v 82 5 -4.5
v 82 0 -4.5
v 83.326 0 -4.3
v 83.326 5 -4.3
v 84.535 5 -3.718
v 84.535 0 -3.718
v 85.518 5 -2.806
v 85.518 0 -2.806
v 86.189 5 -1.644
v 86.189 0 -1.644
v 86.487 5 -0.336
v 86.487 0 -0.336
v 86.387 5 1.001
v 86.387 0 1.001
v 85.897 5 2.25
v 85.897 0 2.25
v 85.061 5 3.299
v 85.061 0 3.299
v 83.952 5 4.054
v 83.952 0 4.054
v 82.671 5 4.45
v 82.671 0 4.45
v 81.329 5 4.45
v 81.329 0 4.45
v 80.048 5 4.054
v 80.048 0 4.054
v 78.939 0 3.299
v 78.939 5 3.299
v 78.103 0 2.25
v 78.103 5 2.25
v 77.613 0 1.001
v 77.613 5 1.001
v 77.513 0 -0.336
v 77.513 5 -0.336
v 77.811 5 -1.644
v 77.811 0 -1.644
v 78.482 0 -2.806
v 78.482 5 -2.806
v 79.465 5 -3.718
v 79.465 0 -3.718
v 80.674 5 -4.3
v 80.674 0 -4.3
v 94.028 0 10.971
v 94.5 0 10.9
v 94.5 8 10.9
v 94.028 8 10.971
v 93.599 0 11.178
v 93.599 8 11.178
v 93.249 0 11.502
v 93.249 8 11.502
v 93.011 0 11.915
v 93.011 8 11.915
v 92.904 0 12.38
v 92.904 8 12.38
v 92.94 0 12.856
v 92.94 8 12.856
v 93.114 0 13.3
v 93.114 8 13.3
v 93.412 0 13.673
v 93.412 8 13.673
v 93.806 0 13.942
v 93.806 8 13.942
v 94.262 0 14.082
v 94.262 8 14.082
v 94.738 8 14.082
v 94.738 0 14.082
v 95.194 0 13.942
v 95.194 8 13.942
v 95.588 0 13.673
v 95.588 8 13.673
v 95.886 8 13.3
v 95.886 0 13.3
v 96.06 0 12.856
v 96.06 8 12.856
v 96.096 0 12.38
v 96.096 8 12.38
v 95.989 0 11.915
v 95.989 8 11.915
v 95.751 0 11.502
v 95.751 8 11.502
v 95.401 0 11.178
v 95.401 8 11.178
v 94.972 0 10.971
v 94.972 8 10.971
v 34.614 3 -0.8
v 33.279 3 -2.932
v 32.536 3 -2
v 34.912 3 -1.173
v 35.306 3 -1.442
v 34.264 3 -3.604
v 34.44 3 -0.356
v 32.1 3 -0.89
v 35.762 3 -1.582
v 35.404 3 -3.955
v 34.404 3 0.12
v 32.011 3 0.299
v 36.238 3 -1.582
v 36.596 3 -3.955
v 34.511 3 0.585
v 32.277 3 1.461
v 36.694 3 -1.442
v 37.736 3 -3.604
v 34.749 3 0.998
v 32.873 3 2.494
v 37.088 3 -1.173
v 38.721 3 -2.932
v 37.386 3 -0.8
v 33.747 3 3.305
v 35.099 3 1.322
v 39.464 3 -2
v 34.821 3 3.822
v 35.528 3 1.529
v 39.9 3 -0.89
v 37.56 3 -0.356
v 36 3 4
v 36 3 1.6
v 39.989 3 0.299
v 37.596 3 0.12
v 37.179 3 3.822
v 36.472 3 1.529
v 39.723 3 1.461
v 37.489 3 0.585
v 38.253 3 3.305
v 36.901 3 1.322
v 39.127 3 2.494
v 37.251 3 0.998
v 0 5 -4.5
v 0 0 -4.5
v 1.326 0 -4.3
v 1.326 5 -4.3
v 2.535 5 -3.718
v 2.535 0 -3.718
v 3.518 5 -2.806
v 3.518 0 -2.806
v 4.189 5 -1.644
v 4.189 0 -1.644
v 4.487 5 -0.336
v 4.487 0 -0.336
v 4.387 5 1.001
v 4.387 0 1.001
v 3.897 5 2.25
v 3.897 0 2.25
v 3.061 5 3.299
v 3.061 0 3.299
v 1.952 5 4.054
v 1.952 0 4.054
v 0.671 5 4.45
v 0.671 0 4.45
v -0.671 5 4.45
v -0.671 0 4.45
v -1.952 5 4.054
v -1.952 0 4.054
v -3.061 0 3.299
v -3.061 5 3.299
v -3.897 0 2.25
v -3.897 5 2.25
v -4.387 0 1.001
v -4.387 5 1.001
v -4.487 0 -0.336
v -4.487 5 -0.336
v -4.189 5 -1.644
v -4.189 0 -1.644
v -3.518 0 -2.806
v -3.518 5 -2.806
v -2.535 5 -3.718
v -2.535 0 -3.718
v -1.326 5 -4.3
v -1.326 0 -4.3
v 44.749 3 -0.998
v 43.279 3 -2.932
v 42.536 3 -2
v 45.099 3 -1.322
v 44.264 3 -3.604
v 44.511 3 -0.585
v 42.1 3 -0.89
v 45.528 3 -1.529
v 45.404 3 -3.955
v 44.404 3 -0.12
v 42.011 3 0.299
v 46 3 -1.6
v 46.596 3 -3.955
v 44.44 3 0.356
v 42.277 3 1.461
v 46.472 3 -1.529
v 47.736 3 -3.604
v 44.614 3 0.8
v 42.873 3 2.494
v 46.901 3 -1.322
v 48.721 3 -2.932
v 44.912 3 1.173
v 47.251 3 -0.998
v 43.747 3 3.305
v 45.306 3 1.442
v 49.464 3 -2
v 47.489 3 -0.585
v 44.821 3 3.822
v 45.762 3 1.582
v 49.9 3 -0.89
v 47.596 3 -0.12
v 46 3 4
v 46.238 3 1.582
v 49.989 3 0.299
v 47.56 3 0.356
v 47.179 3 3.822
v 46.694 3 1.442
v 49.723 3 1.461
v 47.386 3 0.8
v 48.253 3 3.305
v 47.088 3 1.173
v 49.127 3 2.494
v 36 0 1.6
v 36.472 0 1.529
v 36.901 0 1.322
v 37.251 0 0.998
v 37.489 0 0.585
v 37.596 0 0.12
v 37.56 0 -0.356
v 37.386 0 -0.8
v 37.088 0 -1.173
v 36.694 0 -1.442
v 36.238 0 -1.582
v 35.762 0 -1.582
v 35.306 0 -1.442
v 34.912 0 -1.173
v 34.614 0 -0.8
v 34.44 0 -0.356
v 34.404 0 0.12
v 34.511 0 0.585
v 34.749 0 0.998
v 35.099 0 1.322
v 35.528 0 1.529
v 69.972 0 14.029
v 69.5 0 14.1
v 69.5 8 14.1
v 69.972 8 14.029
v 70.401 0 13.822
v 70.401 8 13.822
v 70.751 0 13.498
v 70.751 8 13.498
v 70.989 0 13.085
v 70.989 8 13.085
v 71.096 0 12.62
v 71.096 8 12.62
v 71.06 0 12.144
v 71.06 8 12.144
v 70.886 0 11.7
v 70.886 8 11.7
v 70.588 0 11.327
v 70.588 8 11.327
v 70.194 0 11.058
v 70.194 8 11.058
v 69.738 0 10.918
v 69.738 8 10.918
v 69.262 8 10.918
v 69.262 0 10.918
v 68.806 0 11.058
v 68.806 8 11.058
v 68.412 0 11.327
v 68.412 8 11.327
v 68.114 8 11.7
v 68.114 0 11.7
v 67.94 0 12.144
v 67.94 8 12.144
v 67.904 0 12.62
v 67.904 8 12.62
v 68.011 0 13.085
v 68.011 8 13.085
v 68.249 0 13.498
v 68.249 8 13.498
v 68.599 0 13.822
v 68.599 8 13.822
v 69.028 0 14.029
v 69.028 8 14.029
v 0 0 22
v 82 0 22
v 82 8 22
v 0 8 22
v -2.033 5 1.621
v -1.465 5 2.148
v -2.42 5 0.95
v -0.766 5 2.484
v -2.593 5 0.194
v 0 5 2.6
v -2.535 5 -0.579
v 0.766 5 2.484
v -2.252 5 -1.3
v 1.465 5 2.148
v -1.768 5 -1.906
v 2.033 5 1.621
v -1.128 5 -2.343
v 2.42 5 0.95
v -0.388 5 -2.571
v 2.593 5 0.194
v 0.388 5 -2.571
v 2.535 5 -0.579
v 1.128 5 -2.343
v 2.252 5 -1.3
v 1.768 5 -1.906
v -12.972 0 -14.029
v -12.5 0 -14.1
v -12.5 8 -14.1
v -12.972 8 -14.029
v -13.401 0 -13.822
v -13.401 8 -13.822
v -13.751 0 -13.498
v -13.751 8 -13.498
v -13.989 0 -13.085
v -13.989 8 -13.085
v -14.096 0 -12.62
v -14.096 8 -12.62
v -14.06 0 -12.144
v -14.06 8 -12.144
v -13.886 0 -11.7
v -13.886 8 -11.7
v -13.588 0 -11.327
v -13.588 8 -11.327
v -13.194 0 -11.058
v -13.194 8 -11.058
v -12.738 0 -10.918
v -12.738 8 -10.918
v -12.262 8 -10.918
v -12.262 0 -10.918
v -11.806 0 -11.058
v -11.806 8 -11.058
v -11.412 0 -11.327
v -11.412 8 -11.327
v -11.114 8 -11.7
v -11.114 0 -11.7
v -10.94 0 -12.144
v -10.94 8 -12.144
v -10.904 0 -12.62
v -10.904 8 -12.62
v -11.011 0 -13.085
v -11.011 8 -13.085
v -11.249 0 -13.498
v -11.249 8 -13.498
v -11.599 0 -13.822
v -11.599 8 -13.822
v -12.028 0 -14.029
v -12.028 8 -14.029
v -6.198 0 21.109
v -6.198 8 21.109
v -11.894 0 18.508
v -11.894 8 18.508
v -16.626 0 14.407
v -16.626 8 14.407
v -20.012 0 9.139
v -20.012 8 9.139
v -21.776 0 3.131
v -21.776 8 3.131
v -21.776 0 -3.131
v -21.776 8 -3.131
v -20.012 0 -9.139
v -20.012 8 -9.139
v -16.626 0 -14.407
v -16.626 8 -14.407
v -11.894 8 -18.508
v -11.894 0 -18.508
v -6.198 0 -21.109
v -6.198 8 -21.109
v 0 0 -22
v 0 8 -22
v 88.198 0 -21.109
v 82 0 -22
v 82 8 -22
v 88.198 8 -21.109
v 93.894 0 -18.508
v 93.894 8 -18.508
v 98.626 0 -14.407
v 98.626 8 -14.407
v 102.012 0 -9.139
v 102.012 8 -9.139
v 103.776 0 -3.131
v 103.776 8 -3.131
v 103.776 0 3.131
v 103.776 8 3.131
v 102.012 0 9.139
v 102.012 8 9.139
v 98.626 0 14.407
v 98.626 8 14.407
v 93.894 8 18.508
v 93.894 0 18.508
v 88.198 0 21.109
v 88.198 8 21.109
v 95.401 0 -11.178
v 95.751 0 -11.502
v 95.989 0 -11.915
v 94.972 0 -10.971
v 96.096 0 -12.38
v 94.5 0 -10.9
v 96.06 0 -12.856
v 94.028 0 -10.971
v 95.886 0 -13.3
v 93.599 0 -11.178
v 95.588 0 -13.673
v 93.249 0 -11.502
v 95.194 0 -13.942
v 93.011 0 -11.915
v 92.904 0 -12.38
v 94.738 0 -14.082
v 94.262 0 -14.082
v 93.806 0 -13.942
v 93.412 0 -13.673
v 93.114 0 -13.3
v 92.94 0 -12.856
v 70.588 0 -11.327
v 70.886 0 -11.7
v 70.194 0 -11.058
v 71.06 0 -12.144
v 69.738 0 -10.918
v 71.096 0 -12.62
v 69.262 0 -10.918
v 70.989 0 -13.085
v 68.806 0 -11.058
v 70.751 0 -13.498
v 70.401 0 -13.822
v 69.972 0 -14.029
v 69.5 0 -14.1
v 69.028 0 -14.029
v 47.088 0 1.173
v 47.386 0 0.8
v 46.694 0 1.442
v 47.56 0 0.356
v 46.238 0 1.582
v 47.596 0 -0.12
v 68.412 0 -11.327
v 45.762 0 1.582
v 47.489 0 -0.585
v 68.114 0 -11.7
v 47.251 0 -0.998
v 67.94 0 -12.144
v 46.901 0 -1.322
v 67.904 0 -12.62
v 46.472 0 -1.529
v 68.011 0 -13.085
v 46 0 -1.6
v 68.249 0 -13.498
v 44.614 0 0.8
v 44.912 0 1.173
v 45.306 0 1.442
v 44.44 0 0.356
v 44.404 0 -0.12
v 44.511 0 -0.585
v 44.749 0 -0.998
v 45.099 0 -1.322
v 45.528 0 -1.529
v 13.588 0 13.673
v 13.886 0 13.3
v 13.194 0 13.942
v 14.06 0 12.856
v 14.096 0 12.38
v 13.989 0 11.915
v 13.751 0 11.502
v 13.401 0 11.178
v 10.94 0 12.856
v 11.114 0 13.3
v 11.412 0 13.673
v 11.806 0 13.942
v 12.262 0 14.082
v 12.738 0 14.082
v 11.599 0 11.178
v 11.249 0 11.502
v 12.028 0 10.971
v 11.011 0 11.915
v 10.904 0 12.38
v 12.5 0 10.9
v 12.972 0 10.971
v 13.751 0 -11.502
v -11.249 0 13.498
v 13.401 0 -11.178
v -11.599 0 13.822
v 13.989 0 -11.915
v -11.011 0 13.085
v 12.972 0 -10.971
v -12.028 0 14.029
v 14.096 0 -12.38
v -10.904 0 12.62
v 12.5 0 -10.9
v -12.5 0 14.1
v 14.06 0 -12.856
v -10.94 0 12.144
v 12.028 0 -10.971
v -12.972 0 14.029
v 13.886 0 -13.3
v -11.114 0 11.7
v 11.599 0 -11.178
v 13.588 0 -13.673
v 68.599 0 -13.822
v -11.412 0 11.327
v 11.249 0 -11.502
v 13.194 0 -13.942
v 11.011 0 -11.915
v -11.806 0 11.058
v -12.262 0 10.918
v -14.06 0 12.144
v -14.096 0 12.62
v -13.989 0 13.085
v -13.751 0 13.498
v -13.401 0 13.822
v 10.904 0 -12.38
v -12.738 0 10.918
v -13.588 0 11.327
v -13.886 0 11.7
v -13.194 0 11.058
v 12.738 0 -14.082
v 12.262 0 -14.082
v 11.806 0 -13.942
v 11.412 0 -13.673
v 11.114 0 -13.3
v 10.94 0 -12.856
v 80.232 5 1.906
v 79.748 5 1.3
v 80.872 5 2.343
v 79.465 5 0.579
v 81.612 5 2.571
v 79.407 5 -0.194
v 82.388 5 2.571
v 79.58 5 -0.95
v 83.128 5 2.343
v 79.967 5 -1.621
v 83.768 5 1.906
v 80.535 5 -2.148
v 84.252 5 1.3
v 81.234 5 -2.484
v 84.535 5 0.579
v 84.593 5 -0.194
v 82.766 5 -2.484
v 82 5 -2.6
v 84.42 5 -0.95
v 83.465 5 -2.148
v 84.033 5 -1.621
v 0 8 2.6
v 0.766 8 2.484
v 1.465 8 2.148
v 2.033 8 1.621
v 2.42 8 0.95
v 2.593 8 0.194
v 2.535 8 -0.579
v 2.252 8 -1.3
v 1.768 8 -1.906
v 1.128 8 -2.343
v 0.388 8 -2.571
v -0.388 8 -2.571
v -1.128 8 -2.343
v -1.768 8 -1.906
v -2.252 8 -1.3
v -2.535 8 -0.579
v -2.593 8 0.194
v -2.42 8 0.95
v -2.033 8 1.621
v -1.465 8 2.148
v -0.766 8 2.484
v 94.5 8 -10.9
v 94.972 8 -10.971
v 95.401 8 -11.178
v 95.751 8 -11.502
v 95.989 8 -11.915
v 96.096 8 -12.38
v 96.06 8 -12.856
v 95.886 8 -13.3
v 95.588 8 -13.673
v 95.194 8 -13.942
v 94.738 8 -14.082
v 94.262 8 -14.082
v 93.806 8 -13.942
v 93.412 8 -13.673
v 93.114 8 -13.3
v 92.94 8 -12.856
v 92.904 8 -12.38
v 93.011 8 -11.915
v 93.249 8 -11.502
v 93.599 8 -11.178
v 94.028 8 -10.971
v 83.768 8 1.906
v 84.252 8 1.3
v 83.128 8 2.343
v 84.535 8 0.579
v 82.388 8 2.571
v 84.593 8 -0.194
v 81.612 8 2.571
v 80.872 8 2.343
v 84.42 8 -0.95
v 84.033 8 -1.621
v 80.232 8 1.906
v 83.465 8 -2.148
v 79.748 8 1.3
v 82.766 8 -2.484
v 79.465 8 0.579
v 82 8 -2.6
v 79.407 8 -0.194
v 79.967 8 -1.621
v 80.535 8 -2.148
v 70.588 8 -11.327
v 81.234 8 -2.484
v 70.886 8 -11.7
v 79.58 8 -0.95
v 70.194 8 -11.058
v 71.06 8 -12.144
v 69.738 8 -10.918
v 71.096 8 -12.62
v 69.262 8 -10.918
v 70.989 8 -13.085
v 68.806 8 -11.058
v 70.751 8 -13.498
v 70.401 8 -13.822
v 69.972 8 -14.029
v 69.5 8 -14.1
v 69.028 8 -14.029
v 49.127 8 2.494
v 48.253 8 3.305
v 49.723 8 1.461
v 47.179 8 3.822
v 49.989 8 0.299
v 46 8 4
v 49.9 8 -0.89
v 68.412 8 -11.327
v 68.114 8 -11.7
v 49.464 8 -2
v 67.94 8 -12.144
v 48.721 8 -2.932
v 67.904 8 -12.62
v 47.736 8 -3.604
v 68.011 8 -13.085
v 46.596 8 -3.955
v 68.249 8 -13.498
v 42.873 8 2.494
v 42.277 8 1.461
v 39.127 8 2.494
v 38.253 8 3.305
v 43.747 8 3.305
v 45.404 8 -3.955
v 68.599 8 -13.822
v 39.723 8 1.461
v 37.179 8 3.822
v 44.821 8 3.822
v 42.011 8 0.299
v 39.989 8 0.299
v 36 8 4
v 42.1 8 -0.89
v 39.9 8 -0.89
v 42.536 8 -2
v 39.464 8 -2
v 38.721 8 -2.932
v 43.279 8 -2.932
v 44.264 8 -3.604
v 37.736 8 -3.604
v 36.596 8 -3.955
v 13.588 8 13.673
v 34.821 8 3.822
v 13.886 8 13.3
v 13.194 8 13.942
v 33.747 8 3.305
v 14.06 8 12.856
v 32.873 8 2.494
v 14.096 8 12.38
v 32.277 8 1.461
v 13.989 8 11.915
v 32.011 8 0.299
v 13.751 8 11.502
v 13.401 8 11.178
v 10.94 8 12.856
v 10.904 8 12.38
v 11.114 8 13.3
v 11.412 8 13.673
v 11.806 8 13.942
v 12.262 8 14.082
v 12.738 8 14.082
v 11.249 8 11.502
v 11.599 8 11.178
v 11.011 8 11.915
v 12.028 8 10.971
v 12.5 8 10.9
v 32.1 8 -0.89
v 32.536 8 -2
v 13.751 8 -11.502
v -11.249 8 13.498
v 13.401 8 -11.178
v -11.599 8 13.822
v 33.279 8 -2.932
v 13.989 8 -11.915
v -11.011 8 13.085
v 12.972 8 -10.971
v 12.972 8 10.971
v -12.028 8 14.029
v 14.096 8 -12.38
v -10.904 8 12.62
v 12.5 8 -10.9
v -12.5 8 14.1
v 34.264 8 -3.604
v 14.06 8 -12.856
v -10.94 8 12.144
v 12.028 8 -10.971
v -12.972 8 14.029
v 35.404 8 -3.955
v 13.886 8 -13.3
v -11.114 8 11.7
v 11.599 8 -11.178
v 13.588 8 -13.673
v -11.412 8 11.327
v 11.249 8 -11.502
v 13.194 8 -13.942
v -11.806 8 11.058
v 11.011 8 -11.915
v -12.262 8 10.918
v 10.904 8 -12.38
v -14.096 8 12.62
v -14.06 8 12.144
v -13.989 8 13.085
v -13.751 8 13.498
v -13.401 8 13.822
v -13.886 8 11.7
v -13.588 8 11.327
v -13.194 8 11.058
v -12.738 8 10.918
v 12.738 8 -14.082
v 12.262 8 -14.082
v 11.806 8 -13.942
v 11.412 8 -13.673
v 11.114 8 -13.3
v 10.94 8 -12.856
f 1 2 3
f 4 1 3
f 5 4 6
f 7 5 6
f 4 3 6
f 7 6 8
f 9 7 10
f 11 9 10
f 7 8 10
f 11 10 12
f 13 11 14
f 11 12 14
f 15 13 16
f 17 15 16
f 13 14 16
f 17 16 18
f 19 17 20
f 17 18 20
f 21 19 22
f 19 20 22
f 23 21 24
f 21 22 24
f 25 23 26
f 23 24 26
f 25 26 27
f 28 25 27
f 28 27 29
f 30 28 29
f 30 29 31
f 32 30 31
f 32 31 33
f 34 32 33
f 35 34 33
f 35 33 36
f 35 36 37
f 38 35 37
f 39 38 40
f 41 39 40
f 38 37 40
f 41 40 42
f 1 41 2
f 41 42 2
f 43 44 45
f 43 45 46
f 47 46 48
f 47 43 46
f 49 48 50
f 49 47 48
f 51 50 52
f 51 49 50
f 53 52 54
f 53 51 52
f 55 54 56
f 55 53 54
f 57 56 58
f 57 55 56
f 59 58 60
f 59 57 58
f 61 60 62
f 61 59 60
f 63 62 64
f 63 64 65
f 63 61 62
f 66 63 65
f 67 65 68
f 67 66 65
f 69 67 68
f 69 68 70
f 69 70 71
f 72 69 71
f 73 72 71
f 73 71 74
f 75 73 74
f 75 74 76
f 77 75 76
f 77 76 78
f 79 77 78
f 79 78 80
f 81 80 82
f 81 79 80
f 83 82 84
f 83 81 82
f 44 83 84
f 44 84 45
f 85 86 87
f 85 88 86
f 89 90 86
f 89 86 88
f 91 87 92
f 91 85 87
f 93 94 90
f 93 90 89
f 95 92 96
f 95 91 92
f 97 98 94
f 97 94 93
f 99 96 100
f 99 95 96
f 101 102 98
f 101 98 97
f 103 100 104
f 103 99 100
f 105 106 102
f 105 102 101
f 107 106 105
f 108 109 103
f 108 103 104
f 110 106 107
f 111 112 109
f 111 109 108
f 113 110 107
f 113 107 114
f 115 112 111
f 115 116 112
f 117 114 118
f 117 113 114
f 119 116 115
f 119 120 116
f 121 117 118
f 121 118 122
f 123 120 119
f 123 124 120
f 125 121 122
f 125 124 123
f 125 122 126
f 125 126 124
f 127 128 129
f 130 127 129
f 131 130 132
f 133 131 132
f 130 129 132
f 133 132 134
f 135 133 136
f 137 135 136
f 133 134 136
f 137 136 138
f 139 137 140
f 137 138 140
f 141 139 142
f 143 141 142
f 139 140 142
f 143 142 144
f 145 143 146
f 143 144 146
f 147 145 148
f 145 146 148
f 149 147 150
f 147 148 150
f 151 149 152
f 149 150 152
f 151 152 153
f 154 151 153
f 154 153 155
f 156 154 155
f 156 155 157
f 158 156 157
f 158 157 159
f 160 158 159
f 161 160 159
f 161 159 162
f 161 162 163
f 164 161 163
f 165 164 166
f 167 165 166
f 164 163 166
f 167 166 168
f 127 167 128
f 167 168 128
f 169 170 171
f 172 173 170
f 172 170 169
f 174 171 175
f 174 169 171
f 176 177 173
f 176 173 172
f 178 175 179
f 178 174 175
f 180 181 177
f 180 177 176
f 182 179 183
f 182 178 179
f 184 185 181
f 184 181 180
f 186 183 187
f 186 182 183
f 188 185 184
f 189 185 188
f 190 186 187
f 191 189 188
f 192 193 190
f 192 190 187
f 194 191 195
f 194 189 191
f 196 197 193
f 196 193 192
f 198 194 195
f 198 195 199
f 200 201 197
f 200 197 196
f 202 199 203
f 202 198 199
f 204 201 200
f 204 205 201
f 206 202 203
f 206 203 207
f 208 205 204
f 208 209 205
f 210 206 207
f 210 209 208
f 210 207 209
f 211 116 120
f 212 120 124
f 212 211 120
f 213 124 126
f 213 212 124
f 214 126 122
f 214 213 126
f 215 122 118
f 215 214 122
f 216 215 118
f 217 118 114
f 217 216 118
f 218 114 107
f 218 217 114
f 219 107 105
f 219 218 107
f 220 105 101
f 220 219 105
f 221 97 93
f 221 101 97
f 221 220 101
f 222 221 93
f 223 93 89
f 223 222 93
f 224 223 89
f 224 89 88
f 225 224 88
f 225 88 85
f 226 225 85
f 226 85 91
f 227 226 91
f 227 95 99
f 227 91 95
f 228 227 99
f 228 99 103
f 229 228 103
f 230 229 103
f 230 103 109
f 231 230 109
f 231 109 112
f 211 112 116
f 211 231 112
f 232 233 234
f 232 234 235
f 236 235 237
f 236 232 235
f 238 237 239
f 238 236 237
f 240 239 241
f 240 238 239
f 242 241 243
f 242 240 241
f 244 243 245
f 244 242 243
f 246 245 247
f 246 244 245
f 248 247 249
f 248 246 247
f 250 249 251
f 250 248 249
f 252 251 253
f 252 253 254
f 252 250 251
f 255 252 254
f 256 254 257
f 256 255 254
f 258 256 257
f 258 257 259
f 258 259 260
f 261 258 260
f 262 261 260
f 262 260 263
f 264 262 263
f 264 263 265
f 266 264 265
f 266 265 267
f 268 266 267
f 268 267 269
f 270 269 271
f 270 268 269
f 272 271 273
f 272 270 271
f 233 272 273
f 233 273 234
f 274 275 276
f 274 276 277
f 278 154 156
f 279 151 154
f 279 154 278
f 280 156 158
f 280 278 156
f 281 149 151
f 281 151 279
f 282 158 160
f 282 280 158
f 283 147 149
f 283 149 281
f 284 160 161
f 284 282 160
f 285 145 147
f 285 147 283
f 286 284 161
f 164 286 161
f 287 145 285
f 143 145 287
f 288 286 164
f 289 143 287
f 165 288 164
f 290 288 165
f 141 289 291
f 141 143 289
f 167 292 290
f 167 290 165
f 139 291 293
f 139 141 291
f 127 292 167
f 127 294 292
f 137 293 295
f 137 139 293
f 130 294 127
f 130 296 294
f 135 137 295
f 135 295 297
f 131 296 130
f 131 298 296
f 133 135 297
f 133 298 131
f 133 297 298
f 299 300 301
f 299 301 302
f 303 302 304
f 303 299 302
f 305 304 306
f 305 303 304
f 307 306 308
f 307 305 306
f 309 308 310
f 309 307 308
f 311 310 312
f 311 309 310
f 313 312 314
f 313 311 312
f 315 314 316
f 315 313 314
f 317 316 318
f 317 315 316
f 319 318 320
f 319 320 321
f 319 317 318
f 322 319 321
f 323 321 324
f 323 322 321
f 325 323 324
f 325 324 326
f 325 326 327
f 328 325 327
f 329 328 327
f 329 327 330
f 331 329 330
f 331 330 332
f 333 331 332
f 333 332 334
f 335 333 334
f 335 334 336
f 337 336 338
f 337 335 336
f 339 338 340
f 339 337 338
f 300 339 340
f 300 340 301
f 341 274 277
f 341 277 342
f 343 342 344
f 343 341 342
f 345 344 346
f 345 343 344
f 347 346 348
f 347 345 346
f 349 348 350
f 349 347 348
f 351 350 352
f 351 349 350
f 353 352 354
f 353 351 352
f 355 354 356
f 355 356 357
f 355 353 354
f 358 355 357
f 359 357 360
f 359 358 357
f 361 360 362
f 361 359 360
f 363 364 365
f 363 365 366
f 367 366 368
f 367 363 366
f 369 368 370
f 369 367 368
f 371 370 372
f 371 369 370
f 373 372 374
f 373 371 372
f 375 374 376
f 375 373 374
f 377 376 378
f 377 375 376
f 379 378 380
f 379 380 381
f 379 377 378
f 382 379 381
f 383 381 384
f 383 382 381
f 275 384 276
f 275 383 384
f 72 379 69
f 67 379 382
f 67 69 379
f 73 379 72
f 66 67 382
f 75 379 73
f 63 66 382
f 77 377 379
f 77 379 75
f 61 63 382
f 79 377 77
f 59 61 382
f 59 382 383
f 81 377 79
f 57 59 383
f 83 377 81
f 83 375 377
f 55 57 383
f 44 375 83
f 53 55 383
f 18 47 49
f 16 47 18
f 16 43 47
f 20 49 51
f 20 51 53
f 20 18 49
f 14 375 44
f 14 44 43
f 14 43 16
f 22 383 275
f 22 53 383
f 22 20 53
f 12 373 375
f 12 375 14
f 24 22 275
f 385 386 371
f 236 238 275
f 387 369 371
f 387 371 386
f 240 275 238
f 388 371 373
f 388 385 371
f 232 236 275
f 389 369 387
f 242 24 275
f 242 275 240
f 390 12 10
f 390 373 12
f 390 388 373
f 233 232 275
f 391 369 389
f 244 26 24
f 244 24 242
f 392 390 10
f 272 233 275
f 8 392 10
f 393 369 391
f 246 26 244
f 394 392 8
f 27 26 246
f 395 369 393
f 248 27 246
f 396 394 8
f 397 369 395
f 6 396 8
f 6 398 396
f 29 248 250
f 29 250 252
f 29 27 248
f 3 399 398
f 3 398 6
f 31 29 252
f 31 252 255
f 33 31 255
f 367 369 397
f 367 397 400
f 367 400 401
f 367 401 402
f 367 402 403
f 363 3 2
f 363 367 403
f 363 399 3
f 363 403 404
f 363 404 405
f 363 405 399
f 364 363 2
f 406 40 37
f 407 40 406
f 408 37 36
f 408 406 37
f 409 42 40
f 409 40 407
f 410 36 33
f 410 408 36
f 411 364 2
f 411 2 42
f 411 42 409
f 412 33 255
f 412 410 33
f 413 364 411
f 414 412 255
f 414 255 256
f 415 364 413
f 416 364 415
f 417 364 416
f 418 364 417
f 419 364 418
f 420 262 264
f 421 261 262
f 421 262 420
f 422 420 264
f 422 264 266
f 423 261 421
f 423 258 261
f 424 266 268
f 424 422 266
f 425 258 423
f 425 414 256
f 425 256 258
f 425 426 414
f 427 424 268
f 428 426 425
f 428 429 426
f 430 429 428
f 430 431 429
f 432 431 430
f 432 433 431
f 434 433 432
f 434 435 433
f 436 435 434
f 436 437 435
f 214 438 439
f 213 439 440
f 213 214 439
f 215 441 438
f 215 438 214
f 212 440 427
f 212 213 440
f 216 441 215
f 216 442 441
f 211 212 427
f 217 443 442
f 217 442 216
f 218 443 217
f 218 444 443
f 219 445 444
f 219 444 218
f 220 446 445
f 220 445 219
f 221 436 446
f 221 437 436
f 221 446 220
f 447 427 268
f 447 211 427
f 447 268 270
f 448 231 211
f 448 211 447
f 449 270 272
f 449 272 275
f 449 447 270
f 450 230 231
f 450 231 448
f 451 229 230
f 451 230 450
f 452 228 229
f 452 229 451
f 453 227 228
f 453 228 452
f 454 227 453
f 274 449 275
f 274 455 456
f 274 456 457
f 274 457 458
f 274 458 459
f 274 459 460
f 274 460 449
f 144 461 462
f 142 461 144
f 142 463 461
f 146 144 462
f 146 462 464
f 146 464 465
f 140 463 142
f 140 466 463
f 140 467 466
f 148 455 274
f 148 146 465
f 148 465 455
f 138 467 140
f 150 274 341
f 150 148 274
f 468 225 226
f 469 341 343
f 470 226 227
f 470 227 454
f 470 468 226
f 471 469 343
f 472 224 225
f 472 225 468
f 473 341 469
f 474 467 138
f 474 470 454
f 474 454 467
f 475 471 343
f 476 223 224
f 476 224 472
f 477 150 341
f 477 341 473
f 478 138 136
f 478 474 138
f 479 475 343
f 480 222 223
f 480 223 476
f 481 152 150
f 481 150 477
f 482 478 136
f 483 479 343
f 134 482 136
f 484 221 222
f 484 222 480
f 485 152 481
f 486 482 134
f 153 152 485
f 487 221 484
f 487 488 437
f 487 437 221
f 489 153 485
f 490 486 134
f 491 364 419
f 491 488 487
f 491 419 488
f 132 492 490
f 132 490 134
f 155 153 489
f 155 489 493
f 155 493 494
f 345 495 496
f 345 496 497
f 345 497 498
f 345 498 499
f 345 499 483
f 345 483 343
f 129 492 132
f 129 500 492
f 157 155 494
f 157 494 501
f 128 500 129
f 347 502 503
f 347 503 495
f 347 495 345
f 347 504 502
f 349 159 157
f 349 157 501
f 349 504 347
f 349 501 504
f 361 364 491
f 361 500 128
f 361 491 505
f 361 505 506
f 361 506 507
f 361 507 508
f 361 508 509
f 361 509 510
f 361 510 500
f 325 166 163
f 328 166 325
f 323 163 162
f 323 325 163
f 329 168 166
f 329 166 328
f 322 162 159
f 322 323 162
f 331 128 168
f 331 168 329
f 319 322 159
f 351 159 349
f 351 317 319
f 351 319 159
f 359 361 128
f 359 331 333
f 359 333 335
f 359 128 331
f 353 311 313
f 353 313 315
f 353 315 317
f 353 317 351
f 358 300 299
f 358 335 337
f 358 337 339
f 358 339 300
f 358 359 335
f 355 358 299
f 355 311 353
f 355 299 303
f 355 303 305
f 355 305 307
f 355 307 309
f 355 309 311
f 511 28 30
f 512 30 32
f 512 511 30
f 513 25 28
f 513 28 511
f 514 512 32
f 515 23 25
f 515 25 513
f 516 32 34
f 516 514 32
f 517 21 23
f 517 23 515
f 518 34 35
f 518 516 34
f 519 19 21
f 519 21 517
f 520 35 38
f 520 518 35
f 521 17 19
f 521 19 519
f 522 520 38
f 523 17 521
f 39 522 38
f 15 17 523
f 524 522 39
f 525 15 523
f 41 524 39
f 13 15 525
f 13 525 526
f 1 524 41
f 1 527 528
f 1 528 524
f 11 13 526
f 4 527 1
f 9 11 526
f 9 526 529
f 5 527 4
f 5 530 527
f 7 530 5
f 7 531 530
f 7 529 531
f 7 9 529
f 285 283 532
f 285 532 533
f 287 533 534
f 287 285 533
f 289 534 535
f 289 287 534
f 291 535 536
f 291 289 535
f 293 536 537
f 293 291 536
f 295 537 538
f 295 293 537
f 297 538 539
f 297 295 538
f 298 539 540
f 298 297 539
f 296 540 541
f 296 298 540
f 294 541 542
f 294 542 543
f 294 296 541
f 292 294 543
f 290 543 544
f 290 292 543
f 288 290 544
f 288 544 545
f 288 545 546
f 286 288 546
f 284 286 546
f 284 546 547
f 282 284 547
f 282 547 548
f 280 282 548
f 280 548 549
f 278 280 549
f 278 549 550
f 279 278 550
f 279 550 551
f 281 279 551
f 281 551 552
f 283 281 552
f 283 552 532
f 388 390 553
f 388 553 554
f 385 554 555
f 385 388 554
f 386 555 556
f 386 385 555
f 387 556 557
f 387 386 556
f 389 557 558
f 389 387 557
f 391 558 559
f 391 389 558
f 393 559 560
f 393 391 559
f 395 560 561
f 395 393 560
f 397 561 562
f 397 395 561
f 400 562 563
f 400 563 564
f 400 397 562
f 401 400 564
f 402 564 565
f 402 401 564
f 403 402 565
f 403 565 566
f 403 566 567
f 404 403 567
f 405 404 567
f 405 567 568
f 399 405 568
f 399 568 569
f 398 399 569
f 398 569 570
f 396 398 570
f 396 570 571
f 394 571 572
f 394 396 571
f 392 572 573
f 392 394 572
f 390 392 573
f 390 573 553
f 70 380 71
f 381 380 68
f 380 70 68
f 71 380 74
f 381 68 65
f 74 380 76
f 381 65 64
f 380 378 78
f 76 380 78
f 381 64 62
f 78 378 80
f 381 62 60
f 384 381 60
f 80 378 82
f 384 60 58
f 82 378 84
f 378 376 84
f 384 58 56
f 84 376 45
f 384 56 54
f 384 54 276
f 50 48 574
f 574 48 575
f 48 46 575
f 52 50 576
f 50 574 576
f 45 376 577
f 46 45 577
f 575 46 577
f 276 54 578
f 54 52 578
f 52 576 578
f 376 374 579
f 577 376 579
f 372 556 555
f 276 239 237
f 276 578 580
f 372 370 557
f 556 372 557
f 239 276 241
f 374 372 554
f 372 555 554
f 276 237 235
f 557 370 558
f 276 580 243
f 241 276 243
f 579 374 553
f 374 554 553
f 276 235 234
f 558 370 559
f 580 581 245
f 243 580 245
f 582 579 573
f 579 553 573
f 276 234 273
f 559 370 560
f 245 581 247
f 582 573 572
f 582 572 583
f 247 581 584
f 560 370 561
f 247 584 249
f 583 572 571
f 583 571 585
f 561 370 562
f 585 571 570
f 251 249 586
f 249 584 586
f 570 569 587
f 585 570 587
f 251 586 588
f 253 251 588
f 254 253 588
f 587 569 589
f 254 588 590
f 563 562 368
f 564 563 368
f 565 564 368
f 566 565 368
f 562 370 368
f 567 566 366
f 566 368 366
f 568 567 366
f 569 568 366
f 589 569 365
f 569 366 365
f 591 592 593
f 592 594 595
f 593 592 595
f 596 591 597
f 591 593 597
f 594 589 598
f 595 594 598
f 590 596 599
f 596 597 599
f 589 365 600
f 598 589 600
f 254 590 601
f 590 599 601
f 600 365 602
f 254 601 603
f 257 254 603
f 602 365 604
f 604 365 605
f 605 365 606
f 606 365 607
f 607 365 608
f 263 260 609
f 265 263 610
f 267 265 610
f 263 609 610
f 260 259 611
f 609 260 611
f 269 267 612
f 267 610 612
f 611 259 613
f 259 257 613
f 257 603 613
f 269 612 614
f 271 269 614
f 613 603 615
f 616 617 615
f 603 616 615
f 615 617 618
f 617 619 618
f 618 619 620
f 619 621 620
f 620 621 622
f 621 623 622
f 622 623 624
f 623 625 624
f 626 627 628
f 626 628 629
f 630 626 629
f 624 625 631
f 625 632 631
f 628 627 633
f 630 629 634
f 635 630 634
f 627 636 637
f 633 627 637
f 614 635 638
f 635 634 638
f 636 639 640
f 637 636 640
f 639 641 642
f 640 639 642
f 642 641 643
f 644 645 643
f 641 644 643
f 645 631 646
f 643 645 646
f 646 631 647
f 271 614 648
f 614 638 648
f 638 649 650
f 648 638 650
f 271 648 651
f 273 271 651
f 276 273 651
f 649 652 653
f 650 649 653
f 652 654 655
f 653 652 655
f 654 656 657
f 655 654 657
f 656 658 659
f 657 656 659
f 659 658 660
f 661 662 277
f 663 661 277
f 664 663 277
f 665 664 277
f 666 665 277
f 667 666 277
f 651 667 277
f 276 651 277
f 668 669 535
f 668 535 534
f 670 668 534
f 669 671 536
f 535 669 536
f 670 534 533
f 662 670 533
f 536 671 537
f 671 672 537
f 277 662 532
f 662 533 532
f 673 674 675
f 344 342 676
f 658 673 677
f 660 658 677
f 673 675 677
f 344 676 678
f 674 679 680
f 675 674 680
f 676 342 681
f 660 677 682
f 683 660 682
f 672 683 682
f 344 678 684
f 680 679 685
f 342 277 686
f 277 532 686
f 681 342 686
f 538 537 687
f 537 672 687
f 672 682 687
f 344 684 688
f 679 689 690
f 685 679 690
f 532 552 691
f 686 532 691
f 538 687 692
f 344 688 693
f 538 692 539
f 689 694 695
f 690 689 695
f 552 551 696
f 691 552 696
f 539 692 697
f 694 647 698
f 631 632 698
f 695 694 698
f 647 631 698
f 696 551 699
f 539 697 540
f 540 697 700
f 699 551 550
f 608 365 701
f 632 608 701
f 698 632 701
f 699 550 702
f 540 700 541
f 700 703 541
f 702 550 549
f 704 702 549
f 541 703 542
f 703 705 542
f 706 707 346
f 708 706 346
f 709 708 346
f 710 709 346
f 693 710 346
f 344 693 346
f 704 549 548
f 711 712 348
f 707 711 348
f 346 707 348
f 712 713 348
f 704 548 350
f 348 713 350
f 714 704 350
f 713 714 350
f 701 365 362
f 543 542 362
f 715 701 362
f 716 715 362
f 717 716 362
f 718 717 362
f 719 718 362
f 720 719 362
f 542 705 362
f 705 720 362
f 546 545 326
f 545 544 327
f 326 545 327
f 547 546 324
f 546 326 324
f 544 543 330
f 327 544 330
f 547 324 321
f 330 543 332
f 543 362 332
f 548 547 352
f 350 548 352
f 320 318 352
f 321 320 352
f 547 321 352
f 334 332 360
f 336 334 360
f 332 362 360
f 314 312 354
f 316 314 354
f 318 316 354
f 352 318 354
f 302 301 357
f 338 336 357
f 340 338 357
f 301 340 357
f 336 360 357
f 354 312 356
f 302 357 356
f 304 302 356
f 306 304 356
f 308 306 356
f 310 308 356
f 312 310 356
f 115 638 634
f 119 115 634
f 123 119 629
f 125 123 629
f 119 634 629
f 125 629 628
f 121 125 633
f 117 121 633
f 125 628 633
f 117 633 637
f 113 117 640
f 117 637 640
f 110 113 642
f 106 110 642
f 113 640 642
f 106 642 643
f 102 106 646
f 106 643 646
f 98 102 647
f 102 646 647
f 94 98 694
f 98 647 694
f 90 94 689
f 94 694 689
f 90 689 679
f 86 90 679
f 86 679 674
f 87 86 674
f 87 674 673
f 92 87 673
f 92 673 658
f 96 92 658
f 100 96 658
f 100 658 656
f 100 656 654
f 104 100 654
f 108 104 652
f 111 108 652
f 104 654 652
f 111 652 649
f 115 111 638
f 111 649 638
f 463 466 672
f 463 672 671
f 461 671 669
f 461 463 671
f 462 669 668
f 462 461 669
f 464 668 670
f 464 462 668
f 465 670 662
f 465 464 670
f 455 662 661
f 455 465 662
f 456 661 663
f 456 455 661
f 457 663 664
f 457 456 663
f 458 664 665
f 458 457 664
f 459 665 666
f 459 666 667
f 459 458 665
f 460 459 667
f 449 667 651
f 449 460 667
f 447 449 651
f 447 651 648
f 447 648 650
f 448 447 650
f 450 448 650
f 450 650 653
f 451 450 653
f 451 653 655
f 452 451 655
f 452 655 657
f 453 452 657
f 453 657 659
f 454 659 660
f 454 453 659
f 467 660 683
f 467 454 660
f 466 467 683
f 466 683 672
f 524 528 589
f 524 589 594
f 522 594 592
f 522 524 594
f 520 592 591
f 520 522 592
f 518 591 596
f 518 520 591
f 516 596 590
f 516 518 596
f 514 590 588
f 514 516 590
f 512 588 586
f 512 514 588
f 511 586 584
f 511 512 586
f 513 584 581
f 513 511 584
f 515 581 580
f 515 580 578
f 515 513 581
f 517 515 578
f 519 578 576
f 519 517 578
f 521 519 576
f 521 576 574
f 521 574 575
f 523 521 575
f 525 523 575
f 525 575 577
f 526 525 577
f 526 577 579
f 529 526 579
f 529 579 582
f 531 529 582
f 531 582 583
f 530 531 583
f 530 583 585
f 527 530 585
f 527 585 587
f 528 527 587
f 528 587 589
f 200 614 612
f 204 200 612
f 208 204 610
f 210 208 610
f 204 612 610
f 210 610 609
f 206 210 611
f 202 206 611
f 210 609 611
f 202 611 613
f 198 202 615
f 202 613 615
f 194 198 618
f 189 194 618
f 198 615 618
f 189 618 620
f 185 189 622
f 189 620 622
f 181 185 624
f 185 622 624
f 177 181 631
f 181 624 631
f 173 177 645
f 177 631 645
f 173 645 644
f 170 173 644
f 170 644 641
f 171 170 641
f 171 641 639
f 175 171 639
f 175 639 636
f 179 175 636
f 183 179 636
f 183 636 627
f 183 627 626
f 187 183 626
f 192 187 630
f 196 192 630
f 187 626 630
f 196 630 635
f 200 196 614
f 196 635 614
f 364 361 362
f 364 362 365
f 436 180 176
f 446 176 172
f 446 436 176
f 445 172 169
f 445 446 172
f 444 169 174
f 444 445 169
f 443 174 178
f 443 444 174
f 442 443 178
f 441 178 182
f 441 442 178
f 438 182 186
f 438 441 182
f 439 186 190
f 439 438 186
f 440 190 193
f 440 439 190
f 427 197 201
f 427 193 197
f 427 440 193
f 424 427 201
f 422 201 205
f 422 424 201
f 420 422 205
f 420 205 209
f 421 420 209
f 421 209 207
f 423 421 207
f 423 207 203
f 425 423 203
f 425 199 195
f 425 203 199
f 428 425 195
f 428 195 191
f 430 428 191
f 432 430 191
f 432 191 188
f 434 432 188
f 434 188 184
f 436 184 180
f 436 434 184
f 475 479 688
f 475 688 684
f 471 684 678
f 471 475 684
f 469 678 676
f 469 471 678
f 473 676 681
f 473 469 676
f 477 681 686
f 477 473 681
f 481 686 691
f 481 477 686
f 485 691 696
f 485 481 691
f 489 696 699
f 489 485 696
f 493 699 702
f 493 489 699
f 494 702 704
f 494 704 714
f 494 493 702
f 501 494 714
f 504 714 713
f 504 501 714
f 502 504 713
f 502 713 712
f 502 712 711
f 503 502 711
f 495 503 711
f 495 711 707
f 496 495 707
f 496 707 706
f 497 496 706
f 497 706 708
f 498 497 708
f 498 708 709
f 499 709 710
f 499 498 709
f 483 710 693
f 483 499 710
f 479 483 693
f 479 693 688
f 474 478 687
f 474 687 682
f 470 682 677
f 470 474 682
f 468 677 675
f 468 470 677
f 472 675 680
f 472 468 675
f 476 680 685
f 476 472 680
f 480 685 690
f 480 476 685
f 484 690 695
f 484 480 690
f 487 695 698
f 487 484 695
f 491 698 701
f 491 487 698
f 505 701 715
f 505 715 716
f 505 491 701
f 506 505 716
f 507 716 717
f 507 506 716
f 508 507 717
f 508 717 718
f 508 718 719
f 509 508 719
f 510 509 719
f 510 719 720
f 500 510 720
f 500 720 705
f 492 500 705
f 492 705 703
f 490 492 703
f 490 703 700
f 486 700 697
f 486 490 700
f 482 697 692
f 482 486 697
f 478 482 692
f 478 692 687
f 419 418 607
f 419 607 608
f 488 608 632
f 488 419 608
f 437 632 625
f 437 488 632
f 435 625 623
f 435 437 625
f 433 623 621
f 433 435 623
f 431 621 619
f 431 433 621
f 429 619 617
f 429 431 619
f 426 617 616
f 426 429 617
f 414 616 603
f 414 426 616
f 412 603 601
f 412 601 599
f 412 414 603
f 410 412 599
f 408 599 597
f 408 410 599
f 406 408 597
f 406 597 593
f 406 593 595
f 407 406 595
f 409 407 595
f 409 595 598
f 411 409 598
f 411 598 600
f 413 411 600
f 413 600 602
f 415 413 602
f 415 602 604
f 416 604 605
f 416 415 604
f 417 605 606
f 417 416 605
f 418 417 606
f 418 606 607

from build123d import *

# Parameters (mm, degrees)
SKETCH_1_R          = 2.6
SKETCH_1_R_2        = 1.6
EXTRUDE_1_DEPTH     = 8
SKETCH_2_R          = 4.5
CUT_EXTRUDE_1_DEPTH = 5
SKETCH_3_R          = 4
CUT_EXTRUDE_2_DEPTH = 5


with BuildPart() as part:
    # 草图1 → 凸台-拉伸1 (new body)
    with BuildSketch(Plane(origin=(0, 0, 0), x_dir=(1, 0, 0), z_dir=(0, 1, 0))):
        with BuildLine():
            Line((0, 22), (82, 22))
            ThreePointArc((82, 22), (104, 0), (82, -22))
            Line((82, -22), (0, -22))
            ThreePointArc((0, -22), (-22, 0), (0, 22))
        make_face()
        with Locations(Location((0, 0, 0), (0, 0, 270))):
            Circle(SKETCH_1_R, mode=Mode.SUBTRACT)
        with Locations(Location((82, 0, 0), (0, 0, 90))):
            Circle(SKETCH_1_R, mode=Mode.SUBTRACT)
        with Locations(Location((12.5, 12.5, 0), (0, 0, 270))):
            Circle(SKETCH_1_R_2, mode=Mode.SUBTRACT)
        with Locations(Location((-12.5, 12.5, 0), (0, 0, 90))):
            Circle(SKETCH_1_R_2, mode=Mode.SUBTRACT)
        with Locations(Location((12.5, -12.5, 0), (0, 0, 90))):
            Circle(SKETCH_1_R_2, mode=Mode.SUBTRACT)
        with Locations(Location((-12.5, -12.5, 0), (0, 0, 270))):
            Circle(SKETCH_1_R_2, mode=Mode.SUBTRACT)
        with Locations(Location((94.5, -12.5, 0), (0, 0, 90))):
            Circle(SKETCH_1_R_2, mode=Mode.SUBTRACT)
        with Locations(Location((69.5, -12.5, 0), (0, 0, 270))):
            Circle(SKETCH_1_R_2, mode=Mode.SUBTRACT)
        with Locations(Location((69.5, 12.5, 0), (0, 0, 90))):
            Circle(SKETCH_1_R_2, mode=Mode.SUBTRACT)
        with Locations(Location((94.5, 12.5, 0), (0, 0, 270))):
            Circle(SKETCH_1_R_2, mode=Mode.SUBTRACT)
        with Locations(Location((36, 0, 0), (0, 0, 270))):
            Circle(SKETCH_1_R_2, mode=Mode.SUBTRACT)
        with Locations(Location((46, 0, 0), (0, 0, 90))):
            Circle(SKETCH_1_R_2, mode=Mode.SUBTRACT)
    extrude(amount=EXTRUDE_1_DEPTH)

    # 草图2 → 切除-拉伸1 (cut)
    with BuildSketch(Plane(origin=(0, 0, 0), x_dir=(-1, 0, 0), z_dir=(0, -1, 0))):
        with Locations(Location((0, 0, 0), (0, 0, 90))):
            Circle(SKETCH_2_R)
        with Locations(Location((-82, 0, 0), (0, 0, 90))):
            Circle(SKETCH_2_R)
    extrude(amount=-CUT_EXTRUDE_1_DEPTH, mode=Mode.SUBTRACT)

    # 草图3 → 切除-拉伸2 (cut)
    with BuildSketch(Plane(origin=(0, 8, 0), x_dir=(1, 0, 0), z_dir=(0, 1, 0))):
        with Locations(Location((36, 0, 0), (0, 0, 270))):
            Circle(SKETCH_3_R)
        with Locations(Location((46, 0, 0), (0, 0, 270))):
            Circle(SKETCH_3_R)
    extrude(amount=-CUT_EXTRUDE_2_DEPTH, mode=Mode.SUBTRACT)


solid = part.part
